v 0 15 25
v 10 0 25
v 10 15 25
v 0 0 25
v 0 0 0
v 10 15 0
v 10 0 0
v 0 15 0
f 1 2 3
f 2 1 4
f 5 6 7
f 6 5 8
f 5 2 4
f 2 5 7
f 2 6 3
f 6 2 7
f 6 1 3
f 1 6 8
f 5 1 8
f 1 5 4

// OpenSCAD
// Generated by generate_scads.py
cube(size=[10,15,25], center=false);
